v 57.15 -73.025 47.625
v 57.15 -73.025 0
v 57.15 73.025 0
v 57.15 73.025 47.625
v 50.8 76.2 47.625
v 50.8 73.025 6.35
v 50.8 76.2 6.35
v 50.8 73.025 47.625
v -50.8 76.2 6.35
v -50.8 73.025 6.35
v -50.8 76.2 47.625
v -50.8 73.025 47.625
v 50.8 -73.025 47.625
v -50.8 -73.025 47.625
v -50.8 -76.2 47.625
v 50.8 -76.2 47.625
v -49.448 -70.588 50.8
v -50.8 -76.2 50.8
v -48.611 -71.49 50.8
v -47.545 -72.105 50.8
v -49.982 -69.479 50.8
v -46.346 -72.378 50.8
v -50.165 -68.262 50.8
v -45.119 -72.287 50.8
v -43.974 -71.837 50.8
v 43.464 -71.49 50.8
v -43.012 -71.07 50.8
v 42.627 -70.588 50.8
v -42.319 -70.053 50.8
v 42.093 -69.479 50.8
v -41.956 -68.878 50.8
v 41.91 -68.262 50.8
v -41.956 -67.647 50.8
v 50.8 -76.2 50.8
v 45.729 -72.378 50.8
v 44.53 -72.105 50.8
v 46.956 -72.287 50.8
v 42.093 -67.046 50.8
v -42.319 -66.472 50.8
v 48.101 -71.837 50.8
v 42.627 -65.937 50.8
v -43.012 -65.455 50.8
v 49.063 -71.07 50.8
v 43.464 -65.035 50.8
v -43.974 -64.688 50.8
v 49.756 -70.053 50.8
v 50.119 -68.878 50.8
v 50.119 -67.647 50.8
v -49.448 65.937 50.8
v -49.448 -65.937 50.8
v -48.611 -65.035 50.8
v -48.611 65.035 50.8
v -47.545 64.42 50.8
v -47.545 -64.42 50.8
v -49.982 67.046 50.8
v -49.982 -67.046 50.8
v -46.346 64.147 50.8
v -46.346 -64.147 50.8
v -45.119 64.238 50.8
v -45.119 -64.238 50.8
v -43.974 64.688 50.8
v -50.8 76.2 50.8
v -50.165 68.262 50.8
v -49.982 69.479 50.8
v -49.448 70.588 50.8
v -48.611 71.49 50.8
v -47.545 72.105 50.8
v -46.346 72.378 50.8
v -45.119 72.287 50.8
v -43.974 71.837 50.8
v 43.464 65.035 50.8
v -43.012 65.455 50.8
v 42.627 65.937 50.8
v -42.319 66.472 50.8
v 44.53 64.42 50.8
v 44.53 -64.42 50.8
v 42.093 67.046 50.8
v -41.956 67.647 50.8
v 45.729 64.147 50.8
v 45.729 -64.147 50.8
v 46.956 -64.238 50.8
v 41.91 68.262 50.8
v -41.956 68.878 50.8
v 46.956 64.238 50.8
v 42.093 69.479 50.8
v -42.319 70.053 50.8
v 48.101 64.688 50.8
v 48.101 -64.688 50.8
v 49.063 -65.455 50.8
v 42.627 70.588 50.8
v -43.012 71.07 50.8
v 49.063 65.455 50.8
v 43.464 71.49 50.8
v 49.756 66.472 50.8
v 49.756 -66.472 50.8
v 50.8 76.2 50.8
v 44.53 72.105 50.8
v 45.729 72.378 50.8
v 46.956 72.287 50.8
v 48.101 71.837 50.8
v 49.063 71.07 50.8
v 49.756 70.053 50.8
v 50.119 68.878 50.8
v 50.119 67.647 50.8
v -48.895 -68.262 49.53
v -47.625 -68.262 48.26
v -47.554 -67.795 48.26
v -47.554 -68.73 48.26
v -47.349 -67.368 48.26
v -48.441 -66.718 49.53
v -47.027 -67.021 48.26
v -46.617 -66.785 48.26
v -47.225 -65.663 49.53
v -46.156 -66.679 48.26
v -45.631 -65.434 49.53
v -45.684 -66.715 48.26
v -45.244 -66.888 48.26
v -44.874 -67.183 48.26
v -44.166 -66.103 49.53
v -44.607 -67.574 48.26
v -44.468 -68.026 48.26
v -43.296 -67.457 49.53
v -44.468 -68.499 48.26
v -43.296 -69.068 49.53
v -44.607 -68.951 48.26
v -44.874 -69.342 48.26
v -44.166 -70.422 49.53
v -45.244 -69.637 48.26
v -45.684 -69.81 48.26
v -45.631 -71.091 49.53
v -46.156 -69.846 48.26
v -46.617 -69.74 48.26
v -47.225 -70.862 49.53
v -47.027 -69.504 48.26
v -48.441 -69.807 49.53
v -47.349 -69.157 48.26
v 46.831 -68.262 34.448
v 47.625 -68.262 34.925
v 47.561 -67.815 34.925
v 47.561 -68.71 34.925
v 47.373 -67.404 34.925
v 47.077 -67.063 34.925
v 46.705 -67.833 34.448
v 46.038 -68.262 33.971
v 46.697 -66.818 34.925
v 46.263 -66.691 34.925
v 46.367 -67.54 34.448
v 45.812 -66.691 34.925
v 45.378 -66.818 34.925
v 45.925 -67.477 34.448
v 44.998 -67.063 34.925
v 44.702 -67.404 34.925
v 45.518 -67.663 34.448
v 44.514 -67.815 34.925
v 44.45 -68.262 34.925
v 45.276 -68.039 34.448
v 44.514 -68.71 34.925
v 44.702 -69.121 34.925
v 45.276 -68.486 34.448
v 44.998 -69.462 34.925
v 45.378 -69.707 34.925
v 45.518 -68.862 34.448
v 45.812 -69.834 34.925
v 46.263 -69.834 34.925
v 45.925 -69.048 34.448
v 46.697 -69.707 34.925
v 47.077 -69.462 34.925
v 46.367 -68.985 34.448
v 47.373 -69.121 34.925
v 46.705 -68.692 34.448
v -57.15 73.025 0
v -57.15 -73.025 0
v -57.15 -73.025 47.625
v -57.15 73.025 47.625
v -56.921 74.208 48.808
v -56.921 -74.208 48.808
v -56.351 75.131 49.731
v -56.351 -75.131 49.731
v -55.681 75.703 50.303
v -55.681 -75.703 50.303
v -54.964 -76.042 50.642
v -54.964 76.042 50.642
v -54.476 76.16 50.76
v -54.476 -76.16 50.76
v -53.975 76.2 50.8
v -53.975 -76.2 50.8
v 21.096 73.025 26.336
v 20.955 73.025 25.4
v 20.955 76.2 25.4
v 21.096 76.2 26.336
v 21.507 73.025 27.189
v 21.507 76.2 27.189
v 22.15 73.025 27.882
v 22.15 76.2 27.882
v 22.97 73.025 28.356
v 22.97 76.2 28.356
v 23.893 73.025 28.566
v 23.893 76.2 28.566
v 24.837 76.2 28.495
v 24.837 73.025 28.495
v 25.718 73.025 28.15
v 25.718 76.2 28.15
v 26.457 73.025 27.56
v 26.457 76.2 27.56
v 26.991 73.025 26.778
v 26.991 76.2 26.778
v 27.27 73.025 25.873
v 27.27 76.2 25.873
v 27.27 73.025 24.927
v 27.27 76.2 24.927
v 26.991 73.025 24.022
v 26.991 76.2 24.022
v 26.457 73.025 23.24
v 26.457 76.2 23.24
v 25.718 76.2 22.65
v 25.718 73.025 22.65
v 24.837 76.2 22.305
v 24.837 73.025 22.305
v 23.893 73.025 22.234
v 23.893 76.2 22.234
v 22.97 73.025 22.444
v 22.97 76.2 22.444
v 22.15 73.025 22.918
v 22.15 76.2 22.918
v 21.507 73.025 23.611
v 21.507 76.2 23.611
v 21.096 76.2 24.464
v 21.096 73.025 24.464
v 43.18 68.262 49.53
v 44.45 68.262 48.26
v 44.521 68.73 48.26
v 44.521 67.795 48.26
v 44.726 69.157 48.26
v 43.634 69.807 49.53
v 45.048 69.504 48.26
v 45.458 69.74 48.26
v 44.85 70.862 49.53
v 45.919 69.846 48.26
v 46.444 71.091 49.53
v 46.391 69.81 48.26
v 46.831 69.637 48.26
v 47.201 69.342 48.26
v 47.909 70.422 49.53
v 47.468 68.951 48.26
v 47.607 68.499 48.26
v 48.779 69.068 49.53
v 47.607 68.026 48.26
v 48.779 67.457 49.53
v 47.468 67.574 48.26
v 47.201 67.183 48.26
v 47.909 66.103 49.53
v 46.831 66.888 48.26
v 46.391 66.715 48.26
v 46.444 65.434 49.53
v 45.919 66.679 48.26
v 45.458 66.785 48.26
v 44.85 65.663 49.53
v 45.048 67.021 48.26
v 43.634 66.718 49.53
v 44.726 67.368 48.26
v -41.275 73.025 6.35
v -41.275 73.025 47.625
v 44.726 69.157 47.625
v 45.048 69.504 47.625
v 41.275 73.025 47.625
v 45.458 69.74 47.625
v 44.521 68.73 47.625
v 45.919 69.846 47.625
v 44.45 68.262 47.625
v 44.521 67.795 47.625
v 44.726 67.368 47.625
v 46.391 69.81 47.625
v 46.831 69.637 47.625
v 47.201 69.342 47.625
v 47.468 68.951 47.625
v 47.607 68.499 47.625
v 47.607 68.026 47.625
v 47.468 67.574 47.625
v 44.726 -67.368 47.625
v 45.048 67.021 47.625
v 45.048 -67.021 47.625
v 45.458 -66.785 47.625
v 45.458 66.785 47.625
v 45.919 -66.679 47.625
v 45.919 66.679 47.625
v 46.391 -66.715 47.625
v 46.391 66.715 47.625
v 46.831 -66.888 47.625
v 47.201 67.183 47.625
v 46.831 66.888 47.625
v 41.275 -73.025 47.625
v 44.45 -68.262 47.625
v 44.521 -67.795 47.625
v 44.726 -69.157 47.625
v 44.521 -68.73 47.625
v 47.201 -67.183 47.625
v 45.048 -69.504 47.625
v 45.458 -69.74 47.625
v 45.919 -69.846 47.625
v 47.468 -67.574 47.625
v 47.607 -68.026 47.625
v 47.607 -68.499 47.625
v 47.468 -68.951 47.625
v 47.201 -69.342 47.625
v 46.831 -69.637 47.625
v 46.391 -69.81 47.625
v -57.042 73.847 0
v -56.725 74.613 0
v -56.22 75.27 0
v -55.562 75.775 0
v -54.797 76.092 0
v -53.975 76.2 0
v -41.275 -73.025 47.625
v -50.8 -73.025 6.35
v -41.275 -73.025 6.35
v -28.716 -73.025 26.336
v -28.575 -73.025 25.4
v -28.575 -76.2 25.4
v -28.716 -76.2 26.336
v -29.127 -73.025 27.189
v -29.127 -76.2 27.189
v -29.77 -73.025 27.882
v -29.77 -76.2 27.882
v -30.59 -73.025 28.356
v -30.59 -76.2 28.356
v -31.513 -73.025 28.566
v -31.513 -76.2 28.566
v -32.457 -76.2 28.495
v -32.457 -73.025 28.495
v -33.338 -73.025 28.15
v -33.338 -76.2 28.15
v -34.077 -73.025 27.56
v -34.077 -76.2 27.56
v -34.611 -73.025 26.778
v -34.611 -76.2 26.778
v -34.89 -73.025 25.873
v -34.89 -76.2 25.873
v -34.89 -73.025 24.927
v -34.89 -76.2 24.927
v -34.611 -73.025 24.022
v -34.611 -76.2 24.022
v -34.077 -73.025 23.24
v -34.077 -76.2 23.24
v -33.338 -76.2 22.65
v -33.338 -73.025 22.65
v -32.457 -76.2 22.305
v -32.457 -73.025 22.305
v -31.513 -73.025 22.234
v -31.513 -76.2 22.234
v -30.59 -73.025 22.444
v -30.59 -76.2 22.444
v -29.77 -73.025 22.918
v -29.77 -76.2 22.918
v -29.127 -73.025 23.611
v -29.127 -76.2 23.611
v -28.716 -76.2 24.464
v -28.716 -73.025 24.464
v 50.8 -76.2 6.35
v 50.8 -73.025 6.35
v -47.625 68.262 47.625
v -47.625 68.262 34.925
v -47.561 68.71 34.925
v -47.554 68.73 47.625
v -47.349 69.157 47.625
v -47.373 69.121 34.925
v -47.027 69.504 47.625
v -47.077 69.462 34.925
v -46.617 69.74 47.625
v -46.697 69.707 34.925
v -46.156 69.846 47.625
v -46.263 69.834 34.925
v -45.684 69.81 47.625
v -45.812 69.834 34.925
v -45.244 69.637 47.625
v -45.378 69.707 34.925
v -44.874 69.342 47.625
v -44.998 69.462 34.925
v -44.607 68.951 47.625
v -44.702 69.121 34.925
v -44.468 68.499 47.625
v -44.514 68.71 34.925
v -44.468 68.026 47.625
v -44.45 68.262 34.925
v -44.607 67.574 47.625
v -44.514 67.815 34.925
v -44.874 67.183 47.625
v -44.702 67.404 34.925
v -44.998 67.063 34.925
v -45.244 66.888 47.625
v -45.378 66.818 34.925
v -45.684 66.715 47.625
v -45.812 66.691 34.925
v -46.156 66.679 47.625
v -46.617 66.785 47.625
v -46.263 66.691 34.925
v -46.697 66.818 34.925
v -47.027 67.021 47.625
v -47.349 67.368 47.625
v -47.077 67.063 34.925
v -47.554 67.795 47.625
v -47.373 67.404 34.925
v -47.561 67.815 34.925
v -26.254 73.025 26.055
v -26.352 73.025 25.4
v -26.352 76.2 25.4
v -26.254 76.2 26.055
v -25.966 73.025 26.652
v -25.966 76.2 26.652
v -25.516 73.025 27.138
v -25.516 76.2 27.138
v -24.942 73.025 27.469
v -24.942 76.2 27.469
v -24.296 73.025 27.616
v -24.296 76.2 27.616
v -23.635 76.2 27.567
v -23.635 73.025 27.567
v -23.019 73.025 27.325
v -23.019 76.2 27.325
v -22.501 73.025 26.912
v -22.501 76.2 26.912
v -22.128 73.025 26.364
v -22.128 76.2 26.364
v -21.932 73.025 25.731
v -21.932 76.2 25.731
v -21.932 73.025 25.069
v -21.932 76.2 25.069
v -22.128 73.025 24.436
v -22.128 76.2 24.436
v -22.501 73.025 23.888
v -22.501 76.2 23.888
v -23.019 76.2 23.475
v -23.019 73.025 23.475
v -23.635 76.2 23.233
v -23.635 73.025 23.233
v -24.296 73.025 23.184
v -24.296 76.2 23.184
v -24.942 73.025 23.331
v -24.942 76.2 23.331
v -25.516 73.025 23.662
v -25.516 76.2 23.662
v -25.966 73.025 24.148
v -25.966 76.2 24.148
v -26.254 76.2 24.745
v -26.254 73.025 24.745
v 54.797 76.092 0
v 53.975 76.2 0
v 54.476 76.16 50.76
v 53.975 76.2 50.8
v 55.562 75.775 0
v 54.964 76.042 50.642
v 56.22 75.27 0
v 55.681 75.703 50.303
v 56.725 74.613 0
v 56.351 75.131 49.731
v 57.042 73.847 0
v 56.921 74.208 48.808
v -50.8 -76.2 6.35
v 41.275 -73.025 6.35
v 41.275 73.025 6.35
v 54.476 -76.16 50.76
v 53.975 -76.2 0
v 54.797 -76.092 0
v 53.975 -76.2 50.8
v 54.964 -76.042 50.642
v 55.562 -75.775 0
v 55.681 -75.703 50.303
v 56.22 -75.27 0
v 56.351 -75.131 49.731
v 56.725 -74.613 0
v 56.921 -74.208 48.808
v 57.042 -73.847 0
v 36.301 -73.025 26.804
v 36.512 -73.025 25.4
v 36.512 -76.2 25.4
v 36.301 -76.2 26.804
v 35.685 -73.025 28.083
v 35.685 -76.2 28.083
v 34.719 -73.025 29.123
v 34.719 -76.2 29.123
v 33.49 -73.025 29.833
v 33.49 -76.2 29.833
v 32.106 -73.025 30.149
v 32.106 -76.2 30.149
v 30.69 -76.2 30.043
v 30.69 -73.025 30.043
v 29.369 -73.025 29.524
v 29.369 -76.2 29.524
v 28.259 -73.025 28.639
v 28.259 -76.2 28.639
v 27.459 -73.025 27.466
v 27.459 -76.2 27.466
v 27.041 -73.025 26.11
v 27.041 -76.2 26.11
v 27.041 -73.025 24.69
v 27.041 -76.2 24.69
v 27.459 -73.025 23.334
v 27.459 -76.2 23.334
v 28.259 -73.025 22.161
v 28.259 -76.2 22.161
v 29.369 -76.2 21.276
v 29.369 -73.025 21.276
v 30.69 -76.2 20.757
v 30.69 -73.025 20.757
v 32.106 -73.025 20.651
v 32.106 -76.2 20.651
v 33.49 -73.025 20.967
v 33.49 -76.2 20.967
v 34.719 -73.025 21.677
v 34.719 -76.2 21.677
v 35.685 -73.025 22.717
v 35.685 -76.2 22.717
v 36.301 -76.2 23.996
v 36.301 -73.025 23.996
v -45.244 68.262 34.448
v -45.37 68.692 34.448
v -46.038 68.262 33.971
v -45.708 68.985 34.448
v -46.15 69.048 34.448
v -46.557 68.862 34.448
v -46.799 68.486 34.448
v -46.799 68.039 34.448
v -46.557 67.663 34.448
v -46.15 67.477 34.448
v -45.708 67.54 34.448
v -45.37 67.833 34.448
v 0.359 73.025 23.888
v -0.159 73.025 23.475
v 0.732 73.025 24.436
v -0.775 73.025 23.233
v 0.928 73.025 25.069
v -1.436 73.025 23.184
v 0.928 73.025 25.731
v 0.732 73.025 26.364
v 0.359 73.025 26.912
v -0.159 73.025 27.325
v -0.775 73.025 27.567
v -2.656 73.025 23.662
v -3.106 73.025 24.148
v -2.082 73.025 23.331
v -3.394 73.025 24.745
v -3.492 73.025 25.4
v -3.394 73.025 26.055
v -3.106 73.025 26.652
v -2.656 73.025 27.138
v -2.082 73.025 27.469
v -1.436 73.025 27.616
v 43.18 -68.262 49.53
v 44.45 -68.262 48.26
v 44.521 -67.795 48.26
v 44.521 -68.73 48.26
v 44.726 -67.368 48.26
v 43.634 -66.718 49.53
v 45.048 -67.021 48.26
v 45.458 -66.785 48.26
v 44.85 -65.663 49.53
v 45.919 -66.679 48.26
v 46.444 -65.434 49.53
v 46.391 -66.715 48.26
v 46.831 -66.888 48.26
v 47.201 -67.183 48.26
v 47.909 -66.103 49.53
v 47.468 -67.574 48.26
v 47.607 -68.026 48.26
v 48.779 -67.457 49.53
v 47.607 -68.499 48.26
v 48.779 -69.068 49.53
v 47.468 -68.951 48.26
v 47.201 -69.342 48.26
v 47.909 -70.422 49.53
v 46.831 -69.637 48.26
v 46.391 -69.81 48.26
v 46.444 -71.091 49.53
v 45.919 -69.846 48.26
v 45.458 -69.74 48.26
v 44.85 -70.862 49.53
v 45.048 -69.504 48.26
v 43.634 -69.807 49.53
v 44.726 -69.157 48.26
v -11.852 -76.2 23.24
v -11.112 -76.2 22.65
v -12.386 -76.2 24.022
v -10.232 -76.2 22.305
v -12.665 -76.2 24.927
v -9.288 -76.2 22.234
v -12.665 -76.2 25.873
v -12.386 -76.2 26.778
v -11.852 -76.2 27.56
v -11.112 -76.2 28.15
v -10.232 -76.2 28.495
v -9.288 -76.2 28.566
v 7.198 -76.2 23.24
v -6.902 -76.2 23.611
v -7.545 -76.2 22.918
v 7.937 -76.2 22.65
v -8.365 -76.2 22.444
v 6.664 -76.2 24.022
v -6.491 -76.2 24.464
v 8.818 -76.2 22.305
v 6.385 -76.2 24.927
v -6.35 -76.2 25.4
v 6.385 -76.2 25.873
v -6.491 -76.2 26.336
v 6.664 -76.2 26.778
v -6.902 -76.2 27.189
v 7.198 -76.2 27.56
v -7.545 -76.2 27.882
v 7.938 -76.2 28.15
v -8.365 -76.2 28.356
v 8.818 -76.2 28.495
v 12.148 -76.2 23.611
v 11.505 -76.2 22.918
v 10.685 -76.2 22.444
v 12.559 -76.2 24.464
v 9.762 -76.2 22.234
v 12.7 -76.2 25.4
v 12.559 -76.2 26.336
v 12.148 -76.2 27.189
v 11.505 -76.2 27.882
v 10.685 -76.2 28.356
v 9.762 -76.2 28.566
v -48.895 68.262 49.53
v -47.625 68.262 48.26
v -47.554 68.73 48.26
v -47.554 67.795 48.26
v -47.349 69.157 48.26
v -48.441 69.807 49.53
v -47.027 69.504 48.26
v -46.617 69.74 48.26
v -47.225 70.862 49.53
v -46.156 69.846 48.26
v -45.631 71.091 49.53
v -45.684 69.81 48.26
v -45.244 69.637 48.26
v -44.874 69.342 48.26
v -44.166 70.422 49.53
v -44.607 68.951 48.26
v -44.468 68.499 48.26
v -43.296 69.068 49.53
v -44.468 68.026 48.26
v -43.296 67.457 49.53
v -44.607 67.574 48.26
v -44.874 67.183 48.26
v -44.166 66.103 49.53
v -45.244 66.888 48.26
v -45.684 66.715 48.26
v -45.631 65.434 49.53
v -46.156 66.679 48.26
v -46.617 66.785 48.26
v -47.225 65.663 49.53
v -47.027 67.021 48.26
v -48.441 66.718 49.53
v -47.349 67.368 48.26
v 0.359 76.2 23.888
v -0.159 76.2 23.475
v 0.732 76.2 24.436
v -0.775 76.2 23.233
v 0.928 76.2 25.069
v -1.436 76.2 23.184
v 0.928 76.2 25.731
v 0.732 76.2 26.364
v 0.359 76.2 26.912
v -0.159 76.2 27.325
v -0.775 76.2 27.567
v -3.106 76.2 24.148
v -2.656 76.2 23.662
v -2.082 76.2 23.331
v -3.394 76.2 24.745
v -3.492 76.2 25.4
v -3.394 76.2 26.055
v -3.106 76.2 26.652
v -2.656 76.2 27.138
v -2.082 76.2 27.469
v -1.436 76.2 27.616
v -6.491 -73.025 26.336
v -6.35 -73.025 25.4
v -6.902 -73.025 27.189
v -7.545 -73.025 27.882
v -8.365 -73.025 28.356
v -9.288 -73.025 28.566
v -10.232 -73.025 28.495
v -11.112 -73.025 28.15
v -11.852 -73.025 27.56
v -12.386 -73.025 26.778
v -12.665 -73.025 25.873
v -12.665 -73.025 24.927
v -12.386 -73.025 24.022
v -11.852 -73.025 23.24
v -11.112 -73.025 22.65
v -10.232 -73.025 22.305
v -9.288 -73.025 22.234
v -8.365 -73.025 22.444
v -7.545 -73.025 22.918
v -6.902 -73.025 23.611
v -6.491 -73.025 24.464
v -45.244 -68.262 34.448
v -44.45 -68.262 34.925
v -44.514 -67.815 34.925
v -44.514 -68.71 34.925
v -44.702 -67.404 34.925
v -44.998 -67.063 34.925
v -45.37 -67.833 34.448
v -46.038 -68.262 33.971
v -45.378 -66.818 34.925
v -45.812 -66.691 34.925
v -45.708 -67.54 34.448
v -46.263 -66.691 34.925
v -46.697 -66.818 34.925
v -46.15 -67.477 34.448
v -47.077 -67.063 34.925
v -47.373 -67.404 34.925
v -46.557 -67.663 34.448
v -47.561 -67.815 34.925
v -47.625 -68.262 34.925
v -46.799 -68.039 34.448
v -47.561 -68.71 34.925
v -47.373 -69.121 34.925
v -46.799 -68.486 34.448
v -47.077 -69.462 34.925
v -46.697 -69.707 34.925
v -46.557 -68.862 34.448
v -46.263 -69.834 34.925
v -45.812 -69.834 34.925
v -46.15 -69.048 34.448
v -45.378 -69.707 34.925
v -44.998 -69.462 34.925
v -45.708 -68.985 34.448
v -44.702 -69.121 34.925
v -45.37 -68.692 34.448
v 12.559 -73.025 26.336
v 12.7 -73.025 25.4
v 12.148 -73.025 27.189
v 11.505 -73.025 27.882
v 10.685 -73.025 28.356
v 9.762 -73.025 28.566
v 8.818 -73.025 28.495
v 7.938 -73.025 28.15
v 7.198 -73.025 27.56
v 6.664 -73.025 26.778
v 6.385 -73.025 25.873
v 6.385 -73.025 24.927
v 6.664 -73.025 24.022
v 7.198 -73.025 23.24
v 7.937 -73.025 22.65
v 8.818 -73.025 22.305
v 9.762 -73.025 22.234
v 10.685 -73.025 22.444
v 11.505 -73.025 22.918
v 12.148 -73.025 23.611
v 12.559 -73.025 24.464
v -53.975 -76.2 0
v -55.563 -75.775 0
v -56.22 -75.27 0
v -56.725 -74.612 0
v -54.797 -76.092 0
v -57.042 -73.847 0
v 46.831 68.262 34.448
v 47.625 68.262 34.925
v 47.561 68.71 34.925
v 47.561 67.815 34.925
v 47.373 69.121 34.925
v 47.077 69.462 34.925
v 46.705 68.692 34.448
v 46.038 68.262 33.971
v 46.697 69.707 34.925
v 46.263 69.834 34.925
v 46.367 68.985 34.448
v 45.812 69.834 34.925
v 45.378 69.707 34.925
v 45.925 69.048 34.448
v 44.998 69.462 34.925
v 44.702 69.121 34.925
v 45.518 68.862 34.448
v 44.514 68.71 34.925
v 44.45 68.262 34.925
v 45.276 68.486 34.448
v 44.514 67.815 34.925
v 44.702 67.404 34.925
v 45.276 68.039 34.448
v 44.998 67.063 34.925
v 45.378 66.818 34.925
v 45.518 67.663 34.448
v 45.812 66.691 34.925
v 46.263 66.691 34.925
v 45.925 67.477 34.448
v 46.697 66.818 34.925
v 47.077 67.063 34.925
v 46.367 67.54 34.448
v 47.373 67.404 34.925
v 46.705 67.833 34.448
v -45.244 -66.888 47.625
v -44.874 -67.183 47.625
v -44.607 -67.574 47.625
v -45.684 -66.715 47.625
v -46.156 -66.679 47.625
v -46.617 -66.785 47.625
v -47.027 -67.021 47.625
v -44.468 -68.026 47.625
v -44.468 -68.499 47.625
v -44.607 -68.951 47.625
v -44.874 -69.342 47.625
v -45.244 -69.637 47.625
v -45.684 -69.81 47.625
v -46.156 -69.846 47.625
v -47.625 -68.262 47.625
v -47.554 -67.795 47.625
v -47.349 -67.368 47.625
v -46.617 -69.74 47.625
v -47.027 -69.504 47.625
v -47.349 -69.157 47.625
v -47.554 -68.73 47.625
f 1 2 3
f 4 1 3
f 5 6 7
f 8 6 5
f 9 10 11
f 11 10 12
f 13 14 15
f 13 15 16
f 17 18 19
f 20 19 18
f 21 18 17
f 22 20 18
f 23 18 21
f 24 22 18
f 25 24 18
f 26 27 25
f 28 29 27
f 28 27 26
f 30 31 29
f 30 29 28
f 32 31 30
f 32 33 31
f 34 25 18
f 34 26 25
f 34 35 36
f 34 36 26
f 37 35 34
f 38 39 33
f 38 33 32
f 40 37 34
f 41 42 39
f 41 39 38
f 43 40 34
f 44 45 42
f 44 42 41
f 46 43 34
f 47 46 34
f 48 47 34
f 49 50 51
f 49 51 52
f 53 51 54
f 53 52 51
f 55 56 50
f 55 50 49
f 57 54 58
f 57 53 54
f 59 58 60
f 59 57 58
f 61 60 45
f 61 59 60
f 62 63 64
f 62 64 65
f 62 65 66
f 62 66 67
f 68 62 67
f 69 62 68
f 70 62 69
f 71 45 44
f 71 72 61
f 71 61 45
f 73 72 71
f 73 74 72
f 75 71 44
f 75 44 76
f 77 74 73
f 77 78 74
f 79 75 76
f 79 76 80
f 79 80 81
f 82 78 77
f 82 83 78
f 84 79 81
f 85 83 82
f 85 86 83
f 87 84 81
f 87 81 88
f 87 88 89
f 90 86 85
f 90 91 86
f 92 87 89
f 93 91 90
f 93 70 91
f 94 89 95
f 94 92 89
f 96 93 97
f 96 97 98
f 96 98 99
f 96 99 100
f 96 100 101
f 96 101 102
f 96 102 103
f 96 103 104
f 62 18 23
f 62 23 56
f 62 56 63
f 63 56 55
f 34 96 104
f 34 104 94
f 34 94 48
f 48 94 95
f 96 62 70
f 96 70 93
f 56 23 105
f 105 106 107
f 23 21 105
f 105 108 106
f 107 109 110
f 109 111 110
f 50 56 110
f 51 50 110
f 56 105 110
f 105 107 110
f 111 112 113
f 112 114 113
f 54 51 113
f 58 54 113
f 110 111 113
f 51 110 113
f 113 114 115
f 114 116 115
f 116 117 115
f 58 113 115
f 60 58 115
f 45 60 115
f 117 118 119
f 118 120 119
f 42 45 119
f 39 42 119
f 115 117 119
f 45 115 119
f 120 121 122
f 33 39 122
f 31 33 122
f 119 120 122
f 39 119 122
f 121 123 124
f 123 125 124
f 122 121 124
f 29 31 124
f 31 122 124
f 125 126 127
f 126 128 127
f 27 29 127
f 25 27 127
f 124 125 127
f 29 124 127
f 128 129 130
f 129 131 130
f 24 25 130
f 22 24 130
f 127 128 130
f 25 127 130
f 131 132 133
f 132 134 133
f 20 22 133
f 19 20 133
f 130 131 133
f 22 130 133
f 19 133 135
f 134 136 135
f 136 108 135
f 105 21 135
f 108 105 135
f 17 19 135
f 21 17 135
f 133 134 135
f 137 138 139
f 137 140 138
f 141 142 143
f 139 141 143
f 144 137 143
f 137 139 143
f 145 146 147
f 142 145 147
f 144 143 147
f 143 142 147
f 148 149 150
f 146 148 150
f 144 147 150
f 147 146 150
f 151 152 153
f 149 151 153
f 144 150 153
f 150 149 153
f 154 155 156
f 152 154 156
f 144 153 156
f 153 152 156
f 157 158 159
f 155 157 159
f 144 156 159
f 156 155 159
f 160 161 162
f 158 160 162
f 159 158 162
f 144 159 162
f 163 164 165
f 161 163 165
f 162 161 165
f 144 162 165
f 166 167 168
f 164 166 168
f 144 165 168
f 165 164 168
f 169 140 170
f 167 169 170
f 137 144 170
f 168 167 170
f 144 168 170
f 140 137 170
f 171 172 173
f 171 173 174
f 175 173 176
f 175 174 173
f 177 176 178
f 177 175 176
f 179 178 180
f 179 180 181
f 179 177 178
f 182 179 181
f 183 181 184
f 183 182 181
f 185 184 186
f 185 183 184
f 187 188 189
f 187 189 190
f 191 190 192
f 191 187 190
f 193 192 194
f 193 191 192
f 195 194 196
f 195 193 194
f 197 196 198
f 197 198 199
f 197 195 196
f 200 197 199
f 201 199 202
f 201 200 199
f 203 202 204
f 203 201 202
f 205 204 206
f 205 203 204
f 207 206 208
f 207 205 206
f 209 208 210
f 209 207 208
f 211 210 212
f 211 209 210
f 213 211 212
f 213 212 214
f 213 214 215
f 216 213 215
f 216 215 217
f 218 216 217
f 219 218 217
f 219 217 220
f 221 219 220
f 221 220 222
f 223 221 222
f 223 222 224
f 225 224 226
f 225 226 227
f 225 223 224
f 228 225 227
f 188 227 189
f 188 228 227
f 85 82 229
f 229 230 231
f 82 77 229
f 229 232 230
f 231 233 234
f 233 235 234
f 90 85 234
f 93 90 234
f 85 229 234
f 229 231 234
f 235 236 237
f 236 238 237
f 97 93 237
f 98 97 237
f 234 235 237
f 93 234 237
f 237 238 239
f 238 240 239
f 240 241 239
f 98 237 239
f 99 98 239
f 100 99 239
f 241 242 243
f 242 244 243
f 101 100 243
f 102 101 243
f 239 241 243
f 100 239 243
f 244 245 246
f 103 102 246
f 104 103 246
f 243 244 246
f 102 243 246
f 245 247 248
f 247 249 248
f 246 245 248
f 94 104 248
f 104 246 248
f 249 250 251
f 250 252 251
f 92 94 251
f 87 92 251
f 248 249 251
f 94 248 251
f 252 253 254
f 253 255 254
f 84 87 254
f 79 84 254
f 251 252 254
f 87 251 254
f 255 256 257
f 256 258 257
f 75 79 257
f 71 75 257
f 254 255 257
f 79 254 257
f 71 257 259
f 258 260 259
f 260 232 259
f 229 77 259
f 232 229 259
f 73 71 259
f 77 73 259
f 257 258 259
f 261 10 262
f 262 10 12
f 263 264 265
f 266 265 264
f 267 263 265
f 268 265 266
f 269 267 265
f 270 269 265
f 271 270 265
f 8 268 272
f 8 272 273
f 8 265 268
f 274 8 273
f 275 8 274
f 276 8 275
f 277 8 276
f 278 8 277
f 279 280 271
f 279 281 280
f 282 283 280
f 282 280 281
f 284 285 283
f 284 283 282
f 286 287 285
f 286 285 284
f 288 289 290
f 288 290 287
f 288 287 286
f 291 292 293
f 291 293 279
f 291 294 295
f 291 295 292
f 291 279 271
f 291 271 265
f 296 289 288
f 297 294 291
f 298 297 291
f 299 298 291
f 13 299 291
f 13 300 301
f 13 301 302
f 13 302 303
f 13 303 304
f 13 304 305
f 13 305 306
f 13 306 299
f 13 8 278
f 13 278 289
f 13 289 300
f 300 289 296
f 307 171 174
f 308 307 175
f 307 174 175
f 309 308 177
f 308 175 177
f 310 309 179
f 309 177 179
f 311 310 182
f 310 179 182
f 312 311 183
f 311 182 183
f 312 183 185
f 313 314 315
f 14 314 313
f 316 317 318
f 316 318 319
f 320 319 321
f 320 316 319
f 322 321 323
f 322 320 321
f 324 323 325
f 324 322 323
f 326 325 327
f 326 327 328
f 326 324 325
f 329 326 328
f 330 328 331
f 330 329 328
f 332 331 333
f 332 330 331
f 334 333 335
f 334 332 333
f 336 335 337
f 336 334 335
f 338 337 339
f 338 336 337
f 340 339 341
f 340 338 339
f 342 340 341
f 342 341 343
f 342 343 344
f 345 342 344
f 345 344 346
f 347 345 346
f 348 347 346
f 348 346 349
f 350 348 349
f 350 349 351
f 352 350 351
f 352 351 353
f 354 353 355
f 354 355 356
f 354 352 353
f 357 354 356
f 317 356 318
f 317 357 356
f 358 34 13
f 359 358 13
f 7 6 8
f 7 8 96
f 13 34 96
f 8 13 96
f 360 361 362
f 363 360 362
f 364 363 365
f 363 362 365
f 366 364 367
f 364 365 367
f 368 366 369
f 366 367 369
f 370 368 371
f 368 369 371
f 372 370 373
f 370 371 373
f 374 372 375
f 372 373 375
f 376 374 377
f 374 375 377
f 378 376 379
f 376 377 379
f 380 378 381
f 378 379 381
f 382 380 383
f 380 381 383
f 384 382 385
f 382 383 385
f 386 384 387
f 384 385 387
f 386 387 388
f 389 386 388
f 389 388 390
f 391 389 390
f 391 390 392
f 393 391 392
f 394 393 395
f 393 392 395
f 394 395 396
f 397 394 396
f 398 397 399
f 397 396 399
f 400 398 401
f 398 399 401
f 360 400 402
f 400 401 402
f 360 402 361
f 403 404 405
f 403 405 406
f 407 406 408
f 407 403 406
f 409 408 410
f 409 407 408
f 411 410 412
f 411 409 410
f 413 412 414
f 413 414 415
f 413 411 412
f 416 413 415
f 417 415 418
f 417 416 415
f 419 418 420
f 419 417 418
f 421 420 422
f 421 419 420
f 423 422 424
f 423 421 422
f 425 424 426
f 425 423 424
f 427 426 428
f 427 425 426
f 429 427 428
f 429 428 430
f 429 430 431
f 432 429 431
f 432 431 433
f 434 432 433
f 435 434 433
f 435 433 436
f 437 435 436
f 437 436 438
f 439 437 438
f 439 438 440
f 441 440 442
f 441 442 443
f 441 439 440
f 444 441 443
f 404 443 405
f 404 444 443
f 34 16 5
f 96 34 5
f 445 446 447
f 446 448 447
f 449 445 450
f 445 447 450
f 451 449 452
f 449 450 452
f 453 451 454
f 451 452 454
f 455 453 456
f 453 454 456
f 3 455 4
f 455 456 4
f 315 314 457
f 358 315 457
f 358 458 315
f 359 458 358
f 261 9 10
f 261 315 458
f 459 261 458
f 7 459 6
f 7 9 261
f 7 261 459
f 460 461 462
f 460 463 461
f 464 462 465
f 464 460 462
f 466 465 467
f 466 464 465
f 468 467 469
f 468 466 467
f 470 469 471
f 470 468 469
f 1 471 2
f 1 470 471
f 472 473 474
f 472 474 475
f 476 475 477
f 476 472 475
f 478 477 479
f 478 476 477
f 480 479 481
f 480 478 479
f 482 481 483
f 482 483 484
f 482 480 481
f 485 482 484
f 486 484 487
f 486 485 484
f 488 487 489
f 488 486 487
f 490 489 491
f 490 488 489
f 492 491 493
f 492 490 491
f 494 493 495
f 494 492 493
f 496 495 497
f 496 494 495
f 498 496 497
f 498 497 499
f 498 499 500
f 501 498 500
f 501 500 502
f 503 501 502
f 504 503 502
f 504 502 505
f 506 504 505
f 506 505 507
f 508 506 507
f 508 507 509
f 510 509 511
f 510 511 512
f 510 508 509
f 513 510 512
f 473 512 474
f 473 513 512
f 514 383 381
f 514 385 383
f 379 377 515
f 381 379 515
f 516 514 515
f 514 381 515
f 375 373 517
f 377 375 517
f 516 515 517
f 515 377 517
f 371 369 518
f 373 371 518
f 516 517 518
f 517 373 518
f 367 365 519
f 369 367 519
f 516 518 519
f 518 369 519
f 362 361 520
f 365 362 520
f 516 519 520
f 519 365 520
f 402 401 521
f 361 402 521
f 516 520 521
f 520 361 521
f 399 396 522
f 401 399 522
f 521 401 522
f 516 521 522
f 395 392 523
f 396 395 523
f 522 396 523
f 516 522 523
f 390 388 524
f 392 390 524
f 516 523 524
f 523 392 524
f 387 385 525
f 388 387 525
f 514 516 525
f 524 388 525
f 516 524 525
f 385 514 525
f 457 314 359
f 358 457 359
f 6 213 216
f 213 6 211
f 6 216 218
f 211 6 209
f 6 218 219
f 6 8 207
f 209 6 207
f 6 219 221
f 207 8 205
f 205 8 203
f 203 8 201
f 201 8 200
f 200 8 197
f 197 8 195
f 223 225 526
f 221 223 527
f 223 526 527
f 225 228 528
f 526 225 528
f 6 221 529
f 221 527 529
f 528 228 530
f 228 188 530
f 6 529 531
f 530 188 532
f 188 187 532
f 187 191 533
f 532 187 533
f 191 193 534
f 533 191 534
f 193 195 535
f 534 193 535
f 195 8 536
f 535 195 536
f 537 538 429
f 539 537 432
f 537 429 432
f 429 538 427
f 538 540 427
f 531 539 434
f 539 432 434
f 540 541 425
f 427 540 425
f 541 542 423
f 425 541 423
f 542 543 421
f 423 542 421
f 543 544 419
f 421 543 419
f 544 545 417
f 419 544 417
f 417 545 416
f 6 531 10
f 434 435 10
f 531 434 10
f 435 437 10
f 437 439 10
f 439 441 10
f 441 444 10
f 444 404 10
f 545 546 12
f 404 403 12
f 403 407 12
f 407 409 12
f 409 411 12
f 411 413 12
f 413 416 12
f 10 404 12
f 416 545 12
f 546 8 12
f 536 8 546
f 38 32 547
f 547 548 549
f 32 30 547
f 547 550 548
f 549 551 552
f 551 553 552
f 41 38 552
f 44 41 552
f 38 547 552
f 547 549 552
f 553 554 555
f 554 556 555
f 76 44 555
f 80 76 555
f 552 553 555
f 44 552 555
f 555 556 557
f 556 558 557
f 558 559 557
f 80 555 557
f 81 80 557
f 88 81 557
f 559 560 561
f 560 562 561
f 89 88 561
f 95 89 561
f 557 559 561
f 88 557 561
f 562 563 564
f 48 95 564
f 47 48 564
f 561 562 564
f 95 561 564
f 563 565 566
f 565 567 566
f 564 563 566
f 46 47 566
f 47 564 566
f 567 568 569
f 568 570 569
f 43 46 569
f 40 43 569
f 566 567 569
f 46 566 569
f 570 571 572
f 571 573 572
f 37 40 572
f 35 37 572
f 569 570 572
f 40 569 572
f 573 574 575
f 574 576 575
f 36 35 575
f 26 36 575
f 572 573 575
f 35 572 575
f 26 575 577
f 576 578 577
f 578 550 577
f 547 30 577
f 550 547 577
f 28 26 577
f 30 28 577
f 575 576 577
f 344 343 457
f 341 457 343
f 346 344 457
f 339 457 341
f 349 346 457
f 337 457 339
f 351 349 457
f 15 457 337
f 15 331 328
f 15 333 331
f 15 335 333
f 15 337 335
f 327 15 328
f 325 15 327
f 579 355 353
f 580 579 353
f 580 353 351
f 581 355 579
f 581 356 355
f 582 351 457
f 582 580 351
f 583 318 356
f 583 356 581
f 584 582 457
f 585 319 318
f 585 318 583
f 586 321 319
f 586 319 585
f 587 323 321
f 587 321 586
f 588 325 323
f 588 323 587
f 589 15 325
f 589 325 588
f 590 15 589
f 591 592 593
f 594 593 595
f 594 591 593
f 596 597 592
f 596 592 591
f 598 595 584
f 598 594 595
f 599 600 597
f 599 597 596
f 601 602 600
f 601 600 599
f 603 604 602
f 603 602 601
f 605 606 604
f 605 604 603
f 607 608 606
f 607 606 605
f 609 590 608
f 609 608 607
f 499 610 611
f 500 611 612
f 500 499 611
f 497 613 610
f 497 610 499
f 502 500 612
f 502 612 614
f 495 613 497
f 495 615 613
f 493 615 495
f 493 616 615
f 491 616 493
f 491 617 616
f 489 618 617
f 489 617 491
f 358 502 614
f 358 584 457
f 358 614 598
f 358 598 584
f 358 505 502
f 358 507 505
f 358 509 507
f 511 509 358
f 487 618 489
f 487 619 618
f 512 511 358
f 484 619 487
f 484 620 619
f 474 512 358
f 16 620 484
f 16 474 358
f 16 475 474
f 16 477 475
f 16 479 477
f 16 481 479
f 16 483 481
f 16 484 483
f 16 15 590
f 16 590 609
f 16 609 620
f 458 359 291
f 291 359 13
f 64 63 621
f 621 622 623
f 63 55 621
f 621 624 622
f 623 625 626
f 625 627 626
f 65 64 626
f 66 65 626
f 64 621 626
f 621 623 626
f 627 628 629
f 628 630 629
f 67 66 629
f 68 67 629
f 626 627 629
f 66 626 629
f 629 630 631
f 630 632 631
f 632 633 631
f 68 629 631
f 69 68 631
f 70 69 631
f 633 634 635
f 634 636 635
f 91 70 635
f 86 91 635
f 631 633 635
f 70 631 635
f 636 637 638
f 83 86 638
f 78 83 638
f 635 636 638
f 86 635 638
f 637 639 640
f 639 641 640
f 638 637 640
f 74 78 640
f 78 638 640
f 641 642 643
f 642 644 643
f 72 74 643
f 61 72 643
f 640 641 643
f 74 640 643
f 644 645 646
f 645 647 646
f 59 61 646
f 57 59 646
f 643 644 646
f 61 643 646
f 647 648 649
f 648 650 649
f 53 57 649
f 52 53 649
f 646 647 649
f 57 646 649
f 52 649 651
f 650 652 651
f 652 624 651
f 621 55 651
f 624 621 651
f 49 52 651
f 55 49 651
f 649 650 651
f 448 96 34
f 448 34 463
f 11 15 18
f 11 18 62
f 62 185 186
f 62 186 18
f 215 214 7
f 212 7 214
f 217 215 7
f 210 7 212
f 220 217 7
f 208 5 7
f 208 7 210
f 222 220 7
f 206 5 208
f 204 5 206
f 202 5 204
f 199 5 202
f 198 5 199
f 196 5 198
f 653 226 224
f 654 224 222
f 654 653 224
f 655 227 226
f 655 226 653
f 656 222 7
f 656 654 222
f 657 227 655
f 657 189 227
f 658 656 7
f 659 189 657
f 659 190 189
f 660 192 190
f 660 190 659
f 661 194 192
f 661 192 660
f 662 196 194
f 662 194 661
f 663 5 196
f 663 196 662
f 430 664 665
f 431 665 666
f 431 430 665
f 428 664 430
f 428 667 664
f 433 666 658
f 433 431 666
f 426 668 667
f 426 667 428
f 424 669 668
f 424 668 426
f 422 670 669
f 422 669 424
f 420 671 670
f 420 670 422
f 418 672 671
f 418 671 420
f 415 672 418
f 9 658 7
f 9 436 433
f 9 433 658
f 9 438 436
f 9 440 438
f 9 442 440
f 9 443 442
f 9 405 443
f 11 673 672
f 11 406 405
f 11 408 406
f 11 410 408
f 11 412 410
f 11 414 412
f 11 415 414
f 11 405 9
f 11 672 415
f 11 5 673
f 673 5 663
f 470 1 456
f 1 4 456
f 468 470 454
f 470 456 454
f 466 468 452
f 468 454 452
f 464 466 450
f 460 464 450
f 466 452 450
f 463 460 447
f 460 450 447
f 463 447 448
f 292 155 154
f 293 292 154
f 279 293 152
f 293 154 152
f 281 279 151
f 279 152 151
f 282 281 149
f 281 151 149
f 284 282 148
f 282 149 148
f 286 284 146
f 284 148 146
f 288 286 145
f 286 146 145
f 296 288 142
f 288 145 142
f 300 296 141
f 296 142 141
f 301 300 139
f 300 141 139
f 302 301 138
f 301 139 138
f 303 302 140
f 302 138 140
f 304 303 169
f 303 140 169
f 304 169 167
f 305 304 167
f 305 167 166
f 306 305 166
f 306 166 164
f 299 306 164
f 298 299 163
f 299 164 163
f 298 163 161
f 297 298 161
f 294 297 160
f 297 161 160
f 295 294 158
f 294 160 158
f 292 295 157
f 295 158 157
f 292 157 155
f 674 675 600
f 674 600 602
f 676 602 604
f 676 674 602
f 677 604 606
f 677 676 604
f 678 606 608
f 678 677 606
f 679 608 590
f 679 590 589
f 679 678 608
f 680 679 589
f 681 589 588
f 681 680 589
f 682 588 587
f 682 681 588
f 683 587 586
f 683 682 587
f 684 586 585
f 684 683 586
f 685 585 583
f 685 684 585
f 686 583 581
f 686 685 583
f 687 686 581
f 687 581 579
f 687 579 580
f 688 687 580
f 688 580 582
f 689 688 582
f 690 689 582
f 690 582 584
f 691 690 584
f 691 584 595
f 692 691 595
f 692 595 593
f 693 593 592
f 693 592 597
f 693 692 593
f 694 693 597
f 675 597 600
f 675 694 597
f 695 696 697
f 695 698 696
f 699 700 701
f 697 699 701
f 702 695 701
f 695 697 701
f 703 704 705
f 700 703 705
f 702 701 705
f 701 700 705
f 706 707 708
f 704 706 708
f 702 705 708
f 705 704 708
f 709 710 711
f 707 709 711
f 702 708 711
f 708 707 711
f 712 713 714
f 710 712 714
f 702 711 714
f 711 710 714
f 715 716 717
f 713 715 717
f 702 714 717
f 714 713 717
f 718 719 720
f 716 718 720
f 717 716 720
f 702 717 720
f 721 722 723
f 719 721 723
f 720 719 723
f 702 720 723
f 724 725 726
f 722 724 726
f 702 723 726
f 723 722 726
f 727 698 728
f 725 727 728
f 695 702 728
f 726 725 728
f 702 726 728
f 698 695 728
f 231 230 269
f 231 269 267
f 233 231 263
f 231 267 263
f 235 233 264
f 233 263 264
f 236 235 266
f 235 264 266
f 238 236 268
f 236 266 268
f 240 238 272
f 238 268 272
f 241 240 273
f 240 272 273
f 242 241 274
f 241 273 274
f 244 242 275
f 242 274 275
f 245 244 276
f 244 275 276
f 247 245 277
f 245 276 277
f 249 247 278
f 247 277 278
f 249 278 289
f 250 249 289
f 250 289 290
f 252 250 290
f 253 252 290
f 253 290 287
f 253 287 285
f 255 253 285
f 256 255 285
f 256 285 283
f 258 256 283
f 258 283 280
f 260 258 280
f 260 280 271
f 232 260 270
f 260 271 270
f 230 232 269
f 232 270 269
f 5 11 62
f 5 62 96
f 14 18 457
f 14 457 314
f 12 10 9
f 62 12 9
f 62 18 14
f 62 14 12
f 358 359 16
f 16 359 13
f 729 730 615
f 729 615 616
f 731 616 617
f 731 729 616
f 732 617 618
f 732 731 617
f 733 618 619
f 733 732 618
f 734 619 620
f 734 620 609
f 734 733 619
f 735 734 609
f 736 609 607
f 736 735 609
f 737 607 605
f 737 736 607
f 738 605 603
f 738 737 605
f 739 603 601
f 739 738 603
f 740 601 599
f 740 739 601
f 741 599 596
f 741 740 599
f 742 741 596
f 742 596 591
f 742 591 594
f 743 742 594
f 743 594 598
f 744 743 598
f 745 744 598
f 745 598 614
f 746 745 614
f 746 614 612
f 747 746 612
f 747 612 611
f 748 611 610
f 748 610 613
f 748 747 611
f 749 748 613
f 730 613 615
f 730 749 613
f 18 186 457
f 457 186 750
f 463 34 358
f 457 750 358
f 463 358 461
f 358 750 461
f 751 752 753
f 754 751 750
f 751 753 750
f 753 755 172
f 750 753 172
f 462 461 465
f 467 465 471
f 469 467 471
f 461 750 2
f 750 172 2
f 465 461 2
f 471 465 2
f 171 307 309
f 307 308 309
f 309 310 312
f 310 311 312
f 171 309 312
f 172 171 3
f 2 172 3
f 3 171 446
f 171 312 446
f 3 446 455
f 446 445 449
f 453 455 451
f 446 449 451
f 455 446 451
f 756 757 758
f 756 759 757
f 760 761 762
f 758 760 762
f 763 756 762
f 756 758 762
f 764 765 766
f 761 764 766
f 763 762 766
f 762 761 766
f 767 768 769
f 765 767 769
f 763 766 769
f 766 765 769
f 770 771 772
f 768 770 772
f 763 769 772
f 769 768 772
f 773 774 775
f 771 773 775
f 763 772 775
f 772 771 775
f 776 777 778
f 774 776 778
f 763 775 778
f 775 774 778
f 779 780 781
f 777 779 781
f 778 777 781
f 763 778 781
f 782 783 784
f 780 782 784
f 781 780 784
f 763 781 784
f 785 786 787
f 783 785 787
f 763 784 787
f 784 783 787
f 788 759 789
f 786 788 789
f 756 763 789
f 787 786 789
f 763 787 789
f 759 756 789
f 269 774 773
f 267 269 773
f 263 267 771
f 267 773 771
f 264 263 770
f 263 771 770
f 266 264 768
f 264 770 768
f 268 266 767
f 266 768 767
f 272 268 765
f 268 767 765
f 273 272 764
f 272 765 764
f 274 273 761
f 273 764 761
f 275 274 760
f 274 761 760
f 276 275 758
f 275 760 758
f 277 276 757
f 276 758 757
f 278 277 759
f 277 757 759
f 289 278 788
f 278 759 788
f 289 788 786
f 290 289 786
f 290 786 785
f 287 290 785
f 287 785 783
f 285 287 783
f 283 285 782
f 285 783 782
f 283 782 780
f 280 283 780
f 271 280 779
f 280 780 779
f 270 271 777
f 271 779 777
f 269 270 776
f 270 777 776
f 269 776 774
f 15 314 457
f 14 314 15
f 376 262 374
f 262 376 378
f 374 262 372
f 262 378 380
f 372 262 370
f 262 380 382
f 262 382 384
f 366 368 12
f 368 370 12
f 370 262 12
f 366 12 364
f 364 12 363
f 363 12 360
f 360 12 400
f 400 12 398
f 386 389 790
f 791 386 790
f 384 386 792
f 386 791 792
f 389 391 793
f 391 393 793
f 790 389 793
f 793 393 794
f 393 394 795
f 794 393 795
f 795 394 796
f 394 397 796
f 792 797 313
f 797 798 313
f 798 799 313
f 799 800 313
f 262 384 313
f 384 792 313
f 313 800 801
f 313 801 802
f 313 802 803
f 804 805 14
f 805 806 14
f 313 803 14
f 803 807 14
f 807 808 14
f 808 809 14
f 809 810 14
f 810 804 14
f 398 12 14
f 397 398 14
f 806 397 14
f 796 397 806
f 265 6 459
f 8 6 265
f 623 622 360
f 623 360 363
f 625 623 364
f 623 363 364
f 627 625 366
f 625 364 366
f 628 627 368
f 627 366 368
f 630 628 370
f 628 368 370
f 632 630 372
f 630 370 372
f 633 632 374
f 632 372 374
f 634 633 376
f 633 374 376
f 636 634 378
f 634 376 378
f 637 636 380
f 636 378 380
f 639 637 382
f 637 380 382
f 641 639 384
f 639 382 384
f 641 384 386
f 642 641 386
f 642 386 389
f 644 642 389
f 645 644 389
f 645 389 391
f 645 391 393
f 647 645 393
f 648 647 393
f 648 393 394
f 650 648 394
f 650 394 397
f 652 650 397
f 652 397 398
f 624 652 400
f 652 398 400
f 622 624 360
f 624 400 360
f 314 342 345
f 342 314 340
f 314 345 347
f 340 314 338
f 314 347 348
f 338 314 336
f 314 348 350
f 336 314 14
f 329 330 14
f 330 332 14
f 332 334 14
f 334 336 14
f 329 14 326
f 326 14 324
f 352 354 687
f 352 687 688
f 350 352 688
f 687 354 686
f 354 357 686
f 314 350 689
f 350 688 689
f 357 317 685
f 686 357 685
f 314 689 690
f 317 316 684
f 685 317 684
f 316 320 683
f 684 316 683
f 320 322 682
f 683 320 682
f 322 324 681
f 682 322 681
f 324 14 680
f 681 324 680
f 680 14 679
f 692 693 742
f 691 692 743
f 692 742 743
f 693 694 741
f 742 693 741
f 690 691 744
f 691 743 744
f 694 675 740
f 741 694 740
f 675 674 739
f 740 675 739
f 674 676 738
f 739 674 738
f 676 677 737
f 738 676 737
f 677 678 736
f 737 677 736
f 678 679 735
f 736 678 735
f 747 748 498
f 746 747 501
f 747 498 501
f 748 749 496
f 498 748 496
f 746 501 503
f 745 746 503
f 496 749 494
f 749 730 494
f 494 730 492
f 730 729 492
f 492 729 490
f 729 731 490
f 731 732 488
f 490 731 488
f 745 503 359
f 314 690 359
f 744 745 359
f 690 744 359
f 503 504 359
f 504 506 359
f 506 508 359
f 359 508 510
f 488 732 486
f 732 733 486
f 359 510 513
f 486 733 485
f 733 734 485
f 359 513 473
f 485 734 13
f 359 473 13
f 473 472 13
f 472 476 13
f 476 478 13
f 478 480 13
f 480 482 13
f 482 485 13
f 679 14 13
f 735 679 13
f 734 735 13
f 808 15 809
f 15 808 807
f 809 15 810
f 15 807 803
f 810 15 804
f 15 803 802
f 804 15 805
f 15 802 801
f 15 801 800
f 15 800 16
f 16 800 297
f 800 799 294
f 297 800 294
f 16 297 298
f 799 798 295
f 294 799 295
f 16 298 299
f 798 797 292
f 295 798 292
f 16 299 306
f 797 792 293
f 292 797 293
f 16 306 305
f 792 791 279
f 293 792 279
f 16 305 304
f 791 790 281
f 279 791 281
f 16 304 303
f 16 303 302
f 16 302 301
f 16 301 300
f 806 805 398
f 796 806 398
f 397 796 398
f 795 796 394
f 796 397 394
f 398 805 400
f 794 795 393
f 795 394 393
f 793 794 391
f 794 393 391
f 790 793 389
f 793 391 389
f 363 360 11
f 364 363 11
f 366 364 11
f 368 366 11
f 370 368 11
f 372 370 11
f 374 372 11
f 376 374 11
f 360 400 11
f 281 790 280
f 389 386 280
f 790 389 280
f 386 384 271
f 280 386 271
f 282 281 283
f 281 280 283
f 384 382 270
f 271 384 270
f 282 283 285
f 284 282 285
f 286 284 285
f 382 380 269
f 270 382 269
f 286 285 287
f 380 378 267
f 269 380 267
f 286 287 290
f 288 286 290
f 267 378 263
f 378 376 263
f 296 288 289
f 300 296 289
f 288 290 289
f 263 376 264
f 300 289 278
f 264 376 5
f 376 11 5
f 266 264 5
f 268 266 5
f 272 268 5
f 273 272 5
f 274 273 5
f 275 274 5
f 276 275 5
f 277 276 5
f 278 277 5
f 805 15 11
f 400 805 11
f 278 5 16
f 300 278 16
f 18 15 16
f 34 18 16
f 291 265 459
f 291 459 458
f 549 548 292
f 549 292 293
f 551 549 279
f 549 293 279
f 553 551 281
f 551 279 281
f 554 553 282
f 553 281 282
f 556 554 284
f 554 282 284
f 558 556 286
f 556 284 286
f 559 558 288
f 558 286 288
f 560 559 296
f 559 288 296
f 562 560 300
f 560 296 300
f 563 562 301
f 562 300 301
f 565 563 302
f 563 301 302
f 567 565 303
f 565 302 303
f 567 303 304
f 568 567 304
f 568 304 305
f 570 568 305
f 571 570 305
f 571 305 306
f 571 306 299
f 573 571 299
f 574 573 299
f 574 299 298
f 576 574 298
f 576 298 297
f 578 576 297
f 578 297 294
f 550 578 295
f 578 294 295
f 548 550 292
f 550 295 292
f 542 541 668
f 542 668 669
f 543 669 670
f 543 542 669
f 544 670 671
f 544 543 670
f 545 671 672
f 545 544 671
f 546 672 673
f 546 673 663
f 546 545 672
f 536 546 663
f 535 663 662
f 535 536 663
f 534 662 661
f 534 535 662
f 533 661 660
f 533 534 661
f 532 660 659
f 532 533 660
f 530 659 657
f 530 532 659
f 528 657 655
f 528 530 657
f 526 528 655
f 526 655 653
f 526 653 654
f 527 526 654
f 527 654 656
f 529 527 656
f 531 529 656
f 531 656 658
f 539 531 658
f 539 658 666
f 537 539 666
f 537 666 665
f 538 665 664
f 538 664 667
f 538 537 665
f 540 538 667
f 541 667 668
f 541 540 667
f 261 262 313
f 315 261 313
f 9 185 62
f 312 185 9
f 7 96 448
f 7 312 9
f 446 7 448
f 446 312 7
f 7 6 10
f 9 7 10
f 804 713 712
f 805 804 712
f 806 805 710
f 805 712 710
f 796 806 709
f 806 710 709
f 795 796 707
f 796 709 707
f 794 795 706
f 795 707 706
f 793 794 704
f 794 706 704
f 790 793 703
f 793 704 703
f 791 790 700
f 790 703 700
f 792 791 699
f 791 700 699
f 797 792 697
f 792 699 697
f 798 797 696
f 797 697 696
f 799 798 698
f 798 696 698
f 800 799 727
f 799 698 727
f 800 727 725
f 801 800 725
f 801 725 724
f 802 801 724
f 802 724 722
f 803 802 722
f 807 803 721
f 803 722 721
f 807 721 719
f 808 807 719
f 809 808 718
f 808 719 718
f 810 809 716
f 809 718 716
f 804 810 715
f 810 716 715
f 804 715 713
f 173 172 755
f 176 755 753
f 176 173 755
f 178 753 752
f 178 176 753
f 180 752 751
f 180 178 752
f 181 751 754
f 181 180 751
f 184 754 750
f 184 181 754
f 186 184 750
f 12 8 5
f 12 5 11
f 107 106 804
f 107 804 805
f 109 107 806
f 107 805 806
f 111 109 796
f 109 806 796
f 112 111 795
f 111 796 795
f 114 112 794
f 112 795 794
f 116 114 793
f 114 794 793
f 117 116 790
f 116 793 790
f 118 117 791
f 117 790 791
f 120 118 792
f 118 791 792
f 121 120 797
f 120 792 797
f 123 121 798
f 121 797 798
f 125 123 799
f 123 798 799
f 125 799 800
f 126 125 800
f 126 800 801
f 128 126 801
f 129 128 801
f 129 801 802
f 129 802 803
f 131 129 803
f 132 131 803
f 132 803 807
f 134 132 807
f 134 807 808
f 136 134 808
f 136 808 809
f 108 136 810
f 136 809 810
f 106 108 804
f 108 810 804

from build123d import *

# Parameters (mm, degrees)
F0_W              = 114.3
F0_H              = 152.4
F1_DEPTH          = 50.8
F2_W              = 101.6
F2_H              = 152.4
F3_DEPTH          = 44.45
F4_W              = 146.05
F4_H              = 41.275
F5_DEPTH          = 9.525
F7_R              = 3.175
F8_W              = 101.6
F8_H              = 152.4
F9_DEPTH          = 3.175
F11_D             = 3.175
F11_DEPTH         = 15.875
F11_CSINK_D       = 8.255
F11_CSINK_ANGLE   = 90
F11_TIP           = 0.9538662327
F11_2_D           = 3.175
F11_2_DEPTH       = 15.875
F11_2_CSINK_D     = 8.255
F11_2_CSINK_ANGLE = 90
F11_2_TIP         = 0.9538662327
F12_W             = 101.6
F12_H             = 41.275
F12_R             = 3.175
F12_R_2           = 4.7625
F13_DEPTH         = 3.175
F14_W             = 101.6
F14_H             = 41.275
F14_R             = 3.175
F14_R_2           = 2.2225
F15_DEPTH         = 3.175


with BuildPart() as f1:
    # F0 (on Top) → F1 (new body)
    with BuildSketch(Plane.XY):
        Rectangle(F0_W, F0_H)
    extrude(amount=F1_DEPTH)

    # F2 (on face) → F3 (cut, through all)
    with BuildSketch(Plane.XY.offset(50.8)):
        Rectangle(F2_W, F2_H)
    extrude(amount=-F3_DEPTH, mode=Mode.SUBTRACT)

    # F4 (on face) → F5 (join)
    with BuildSketch(Plane(origin=(50.8, 0, 0), x_dir=(0, -1, 0), z_dir=(-1, 0, 0))):
        with Locations((0, 26.9875)):
            Rectangle(F4_W, F4_H)
    extrude(amount=F5_DEPTH)

    # F6: F1 across plane


with BuildPart() as f1_1:
    add(f1.part)
    add(f1.part.mirror(Plane.YZ))

    # F7
    f7_edges = [f1_1.edges().sort_by_distance(p)[0] for p in [
        (57.15, 0, 50.8),
        (57.15, 76.2, 25.4),
        (57.15, -76.2, 25.4),
        (-57.15, 0, 50.8),
        (-57.15, 76.2, 25.4),
        (-57.15, -76.2, 25.4),
    ]]
    fillet(f7_edges, radius=F7_R)

    # F11
    with Locations(Plane.XY.offset(50.8)):
        with Locations((-46.0375, -68.2625), (46.0375, -68.2625), (46.0375, 68.2625), (-46.0375, 68.2625)):
            CounterSinkHole(F11_D / 2, F11_CSINK_D / 2, depth=F11_DEPTH, counter_sink_angle=F11_CSINK_ANGLE)
            with Locations((0, 0, -(F11_DEPTH + F11_TIP / 2))):  # 118° drill point
                Cone(0, F11_D / 2, F11_TIP, mode=Mode.SUBTRACT)


with BuildPart() as f9:
    # F8 (on face) → F9 (new body, through all)
    with BuildSketch(Plane.XY.offset(47.625)):
        Rectangle(F8_W, F8_H)
    extrude(amount=F9_DEPTH)

    # F11#2
    with Locations(Plane.XY.offset(50.8)):
        with Locations((-46.0375, -68.2625), (46.0375, -68.2625), (46.0375, 68.2625), (-46.0375, 68.2625)):
            CounterSinkHole(F11_2_D / 2, F11_2_CSINK_D / 2, depth=F11_2_DEPTH, counter_sink_angle=F11_2_CSINK_ANGLE)
            with Locations((0, 0, -(F11_2_DEPTH + F11_2_TIP / 2))):  # 118° drill point
                Cone(0, F11_2_D / 2, F11_2_TIP, mode=Mode.SUBTRACT)


with BuildPart() as f13:
    # F12 (on face) → F13 (new body, through all)
    with BuildSketch(Plane.XZ.offset(73.025)):
        with Locations((0, 26.9875)):
            Rectangle(F12_W, F12_H)
        with Locations((-31.75, 25.4)):
            Circle(F12_R, mode=Mode.SUBTRACT)
        with Locations((-9.525, 25.4)):
            Circle(F12_R, mode=Mode.SUBTRACT)
        with Locations((9.525, 25.4)):
            Circle(F12_R, mode=Mode.SUBTRACT)
        with Locations((31.75, 25.4)):
            Circle(F12_R_2, mode=Mode.SUBTRACT)
    extrude(amount=F13_DEPTH)


with BuildPart() as f15:
    # F14 (on face) → F15 (new body, through all)
    with BuildSketch(Plane(origin=(0, 73.025, 0), x_dir=(-1, 0, 0), z_dir=(0, 1, 0))):
        with Locations((0, 26.9875)):
            Rectangle(F14_W, F14_H)
        with Locations((-24.13, 25.4)):
            Circle(F14_R, mode=Mode.SUBTRACT)
        with Locations((1.27, 25.4)):
            Circle(F14_R_2, mode=Mode.SUBTRACT)
        with Locations((24.13, 25.4)):
            Circle(F14_R_2, mode=Mode.SUBTRACT)
    extrude(amount=F15_DEPTH)


solid = Compound([f1_1.part, f9.part, f13.part, f15.part])
